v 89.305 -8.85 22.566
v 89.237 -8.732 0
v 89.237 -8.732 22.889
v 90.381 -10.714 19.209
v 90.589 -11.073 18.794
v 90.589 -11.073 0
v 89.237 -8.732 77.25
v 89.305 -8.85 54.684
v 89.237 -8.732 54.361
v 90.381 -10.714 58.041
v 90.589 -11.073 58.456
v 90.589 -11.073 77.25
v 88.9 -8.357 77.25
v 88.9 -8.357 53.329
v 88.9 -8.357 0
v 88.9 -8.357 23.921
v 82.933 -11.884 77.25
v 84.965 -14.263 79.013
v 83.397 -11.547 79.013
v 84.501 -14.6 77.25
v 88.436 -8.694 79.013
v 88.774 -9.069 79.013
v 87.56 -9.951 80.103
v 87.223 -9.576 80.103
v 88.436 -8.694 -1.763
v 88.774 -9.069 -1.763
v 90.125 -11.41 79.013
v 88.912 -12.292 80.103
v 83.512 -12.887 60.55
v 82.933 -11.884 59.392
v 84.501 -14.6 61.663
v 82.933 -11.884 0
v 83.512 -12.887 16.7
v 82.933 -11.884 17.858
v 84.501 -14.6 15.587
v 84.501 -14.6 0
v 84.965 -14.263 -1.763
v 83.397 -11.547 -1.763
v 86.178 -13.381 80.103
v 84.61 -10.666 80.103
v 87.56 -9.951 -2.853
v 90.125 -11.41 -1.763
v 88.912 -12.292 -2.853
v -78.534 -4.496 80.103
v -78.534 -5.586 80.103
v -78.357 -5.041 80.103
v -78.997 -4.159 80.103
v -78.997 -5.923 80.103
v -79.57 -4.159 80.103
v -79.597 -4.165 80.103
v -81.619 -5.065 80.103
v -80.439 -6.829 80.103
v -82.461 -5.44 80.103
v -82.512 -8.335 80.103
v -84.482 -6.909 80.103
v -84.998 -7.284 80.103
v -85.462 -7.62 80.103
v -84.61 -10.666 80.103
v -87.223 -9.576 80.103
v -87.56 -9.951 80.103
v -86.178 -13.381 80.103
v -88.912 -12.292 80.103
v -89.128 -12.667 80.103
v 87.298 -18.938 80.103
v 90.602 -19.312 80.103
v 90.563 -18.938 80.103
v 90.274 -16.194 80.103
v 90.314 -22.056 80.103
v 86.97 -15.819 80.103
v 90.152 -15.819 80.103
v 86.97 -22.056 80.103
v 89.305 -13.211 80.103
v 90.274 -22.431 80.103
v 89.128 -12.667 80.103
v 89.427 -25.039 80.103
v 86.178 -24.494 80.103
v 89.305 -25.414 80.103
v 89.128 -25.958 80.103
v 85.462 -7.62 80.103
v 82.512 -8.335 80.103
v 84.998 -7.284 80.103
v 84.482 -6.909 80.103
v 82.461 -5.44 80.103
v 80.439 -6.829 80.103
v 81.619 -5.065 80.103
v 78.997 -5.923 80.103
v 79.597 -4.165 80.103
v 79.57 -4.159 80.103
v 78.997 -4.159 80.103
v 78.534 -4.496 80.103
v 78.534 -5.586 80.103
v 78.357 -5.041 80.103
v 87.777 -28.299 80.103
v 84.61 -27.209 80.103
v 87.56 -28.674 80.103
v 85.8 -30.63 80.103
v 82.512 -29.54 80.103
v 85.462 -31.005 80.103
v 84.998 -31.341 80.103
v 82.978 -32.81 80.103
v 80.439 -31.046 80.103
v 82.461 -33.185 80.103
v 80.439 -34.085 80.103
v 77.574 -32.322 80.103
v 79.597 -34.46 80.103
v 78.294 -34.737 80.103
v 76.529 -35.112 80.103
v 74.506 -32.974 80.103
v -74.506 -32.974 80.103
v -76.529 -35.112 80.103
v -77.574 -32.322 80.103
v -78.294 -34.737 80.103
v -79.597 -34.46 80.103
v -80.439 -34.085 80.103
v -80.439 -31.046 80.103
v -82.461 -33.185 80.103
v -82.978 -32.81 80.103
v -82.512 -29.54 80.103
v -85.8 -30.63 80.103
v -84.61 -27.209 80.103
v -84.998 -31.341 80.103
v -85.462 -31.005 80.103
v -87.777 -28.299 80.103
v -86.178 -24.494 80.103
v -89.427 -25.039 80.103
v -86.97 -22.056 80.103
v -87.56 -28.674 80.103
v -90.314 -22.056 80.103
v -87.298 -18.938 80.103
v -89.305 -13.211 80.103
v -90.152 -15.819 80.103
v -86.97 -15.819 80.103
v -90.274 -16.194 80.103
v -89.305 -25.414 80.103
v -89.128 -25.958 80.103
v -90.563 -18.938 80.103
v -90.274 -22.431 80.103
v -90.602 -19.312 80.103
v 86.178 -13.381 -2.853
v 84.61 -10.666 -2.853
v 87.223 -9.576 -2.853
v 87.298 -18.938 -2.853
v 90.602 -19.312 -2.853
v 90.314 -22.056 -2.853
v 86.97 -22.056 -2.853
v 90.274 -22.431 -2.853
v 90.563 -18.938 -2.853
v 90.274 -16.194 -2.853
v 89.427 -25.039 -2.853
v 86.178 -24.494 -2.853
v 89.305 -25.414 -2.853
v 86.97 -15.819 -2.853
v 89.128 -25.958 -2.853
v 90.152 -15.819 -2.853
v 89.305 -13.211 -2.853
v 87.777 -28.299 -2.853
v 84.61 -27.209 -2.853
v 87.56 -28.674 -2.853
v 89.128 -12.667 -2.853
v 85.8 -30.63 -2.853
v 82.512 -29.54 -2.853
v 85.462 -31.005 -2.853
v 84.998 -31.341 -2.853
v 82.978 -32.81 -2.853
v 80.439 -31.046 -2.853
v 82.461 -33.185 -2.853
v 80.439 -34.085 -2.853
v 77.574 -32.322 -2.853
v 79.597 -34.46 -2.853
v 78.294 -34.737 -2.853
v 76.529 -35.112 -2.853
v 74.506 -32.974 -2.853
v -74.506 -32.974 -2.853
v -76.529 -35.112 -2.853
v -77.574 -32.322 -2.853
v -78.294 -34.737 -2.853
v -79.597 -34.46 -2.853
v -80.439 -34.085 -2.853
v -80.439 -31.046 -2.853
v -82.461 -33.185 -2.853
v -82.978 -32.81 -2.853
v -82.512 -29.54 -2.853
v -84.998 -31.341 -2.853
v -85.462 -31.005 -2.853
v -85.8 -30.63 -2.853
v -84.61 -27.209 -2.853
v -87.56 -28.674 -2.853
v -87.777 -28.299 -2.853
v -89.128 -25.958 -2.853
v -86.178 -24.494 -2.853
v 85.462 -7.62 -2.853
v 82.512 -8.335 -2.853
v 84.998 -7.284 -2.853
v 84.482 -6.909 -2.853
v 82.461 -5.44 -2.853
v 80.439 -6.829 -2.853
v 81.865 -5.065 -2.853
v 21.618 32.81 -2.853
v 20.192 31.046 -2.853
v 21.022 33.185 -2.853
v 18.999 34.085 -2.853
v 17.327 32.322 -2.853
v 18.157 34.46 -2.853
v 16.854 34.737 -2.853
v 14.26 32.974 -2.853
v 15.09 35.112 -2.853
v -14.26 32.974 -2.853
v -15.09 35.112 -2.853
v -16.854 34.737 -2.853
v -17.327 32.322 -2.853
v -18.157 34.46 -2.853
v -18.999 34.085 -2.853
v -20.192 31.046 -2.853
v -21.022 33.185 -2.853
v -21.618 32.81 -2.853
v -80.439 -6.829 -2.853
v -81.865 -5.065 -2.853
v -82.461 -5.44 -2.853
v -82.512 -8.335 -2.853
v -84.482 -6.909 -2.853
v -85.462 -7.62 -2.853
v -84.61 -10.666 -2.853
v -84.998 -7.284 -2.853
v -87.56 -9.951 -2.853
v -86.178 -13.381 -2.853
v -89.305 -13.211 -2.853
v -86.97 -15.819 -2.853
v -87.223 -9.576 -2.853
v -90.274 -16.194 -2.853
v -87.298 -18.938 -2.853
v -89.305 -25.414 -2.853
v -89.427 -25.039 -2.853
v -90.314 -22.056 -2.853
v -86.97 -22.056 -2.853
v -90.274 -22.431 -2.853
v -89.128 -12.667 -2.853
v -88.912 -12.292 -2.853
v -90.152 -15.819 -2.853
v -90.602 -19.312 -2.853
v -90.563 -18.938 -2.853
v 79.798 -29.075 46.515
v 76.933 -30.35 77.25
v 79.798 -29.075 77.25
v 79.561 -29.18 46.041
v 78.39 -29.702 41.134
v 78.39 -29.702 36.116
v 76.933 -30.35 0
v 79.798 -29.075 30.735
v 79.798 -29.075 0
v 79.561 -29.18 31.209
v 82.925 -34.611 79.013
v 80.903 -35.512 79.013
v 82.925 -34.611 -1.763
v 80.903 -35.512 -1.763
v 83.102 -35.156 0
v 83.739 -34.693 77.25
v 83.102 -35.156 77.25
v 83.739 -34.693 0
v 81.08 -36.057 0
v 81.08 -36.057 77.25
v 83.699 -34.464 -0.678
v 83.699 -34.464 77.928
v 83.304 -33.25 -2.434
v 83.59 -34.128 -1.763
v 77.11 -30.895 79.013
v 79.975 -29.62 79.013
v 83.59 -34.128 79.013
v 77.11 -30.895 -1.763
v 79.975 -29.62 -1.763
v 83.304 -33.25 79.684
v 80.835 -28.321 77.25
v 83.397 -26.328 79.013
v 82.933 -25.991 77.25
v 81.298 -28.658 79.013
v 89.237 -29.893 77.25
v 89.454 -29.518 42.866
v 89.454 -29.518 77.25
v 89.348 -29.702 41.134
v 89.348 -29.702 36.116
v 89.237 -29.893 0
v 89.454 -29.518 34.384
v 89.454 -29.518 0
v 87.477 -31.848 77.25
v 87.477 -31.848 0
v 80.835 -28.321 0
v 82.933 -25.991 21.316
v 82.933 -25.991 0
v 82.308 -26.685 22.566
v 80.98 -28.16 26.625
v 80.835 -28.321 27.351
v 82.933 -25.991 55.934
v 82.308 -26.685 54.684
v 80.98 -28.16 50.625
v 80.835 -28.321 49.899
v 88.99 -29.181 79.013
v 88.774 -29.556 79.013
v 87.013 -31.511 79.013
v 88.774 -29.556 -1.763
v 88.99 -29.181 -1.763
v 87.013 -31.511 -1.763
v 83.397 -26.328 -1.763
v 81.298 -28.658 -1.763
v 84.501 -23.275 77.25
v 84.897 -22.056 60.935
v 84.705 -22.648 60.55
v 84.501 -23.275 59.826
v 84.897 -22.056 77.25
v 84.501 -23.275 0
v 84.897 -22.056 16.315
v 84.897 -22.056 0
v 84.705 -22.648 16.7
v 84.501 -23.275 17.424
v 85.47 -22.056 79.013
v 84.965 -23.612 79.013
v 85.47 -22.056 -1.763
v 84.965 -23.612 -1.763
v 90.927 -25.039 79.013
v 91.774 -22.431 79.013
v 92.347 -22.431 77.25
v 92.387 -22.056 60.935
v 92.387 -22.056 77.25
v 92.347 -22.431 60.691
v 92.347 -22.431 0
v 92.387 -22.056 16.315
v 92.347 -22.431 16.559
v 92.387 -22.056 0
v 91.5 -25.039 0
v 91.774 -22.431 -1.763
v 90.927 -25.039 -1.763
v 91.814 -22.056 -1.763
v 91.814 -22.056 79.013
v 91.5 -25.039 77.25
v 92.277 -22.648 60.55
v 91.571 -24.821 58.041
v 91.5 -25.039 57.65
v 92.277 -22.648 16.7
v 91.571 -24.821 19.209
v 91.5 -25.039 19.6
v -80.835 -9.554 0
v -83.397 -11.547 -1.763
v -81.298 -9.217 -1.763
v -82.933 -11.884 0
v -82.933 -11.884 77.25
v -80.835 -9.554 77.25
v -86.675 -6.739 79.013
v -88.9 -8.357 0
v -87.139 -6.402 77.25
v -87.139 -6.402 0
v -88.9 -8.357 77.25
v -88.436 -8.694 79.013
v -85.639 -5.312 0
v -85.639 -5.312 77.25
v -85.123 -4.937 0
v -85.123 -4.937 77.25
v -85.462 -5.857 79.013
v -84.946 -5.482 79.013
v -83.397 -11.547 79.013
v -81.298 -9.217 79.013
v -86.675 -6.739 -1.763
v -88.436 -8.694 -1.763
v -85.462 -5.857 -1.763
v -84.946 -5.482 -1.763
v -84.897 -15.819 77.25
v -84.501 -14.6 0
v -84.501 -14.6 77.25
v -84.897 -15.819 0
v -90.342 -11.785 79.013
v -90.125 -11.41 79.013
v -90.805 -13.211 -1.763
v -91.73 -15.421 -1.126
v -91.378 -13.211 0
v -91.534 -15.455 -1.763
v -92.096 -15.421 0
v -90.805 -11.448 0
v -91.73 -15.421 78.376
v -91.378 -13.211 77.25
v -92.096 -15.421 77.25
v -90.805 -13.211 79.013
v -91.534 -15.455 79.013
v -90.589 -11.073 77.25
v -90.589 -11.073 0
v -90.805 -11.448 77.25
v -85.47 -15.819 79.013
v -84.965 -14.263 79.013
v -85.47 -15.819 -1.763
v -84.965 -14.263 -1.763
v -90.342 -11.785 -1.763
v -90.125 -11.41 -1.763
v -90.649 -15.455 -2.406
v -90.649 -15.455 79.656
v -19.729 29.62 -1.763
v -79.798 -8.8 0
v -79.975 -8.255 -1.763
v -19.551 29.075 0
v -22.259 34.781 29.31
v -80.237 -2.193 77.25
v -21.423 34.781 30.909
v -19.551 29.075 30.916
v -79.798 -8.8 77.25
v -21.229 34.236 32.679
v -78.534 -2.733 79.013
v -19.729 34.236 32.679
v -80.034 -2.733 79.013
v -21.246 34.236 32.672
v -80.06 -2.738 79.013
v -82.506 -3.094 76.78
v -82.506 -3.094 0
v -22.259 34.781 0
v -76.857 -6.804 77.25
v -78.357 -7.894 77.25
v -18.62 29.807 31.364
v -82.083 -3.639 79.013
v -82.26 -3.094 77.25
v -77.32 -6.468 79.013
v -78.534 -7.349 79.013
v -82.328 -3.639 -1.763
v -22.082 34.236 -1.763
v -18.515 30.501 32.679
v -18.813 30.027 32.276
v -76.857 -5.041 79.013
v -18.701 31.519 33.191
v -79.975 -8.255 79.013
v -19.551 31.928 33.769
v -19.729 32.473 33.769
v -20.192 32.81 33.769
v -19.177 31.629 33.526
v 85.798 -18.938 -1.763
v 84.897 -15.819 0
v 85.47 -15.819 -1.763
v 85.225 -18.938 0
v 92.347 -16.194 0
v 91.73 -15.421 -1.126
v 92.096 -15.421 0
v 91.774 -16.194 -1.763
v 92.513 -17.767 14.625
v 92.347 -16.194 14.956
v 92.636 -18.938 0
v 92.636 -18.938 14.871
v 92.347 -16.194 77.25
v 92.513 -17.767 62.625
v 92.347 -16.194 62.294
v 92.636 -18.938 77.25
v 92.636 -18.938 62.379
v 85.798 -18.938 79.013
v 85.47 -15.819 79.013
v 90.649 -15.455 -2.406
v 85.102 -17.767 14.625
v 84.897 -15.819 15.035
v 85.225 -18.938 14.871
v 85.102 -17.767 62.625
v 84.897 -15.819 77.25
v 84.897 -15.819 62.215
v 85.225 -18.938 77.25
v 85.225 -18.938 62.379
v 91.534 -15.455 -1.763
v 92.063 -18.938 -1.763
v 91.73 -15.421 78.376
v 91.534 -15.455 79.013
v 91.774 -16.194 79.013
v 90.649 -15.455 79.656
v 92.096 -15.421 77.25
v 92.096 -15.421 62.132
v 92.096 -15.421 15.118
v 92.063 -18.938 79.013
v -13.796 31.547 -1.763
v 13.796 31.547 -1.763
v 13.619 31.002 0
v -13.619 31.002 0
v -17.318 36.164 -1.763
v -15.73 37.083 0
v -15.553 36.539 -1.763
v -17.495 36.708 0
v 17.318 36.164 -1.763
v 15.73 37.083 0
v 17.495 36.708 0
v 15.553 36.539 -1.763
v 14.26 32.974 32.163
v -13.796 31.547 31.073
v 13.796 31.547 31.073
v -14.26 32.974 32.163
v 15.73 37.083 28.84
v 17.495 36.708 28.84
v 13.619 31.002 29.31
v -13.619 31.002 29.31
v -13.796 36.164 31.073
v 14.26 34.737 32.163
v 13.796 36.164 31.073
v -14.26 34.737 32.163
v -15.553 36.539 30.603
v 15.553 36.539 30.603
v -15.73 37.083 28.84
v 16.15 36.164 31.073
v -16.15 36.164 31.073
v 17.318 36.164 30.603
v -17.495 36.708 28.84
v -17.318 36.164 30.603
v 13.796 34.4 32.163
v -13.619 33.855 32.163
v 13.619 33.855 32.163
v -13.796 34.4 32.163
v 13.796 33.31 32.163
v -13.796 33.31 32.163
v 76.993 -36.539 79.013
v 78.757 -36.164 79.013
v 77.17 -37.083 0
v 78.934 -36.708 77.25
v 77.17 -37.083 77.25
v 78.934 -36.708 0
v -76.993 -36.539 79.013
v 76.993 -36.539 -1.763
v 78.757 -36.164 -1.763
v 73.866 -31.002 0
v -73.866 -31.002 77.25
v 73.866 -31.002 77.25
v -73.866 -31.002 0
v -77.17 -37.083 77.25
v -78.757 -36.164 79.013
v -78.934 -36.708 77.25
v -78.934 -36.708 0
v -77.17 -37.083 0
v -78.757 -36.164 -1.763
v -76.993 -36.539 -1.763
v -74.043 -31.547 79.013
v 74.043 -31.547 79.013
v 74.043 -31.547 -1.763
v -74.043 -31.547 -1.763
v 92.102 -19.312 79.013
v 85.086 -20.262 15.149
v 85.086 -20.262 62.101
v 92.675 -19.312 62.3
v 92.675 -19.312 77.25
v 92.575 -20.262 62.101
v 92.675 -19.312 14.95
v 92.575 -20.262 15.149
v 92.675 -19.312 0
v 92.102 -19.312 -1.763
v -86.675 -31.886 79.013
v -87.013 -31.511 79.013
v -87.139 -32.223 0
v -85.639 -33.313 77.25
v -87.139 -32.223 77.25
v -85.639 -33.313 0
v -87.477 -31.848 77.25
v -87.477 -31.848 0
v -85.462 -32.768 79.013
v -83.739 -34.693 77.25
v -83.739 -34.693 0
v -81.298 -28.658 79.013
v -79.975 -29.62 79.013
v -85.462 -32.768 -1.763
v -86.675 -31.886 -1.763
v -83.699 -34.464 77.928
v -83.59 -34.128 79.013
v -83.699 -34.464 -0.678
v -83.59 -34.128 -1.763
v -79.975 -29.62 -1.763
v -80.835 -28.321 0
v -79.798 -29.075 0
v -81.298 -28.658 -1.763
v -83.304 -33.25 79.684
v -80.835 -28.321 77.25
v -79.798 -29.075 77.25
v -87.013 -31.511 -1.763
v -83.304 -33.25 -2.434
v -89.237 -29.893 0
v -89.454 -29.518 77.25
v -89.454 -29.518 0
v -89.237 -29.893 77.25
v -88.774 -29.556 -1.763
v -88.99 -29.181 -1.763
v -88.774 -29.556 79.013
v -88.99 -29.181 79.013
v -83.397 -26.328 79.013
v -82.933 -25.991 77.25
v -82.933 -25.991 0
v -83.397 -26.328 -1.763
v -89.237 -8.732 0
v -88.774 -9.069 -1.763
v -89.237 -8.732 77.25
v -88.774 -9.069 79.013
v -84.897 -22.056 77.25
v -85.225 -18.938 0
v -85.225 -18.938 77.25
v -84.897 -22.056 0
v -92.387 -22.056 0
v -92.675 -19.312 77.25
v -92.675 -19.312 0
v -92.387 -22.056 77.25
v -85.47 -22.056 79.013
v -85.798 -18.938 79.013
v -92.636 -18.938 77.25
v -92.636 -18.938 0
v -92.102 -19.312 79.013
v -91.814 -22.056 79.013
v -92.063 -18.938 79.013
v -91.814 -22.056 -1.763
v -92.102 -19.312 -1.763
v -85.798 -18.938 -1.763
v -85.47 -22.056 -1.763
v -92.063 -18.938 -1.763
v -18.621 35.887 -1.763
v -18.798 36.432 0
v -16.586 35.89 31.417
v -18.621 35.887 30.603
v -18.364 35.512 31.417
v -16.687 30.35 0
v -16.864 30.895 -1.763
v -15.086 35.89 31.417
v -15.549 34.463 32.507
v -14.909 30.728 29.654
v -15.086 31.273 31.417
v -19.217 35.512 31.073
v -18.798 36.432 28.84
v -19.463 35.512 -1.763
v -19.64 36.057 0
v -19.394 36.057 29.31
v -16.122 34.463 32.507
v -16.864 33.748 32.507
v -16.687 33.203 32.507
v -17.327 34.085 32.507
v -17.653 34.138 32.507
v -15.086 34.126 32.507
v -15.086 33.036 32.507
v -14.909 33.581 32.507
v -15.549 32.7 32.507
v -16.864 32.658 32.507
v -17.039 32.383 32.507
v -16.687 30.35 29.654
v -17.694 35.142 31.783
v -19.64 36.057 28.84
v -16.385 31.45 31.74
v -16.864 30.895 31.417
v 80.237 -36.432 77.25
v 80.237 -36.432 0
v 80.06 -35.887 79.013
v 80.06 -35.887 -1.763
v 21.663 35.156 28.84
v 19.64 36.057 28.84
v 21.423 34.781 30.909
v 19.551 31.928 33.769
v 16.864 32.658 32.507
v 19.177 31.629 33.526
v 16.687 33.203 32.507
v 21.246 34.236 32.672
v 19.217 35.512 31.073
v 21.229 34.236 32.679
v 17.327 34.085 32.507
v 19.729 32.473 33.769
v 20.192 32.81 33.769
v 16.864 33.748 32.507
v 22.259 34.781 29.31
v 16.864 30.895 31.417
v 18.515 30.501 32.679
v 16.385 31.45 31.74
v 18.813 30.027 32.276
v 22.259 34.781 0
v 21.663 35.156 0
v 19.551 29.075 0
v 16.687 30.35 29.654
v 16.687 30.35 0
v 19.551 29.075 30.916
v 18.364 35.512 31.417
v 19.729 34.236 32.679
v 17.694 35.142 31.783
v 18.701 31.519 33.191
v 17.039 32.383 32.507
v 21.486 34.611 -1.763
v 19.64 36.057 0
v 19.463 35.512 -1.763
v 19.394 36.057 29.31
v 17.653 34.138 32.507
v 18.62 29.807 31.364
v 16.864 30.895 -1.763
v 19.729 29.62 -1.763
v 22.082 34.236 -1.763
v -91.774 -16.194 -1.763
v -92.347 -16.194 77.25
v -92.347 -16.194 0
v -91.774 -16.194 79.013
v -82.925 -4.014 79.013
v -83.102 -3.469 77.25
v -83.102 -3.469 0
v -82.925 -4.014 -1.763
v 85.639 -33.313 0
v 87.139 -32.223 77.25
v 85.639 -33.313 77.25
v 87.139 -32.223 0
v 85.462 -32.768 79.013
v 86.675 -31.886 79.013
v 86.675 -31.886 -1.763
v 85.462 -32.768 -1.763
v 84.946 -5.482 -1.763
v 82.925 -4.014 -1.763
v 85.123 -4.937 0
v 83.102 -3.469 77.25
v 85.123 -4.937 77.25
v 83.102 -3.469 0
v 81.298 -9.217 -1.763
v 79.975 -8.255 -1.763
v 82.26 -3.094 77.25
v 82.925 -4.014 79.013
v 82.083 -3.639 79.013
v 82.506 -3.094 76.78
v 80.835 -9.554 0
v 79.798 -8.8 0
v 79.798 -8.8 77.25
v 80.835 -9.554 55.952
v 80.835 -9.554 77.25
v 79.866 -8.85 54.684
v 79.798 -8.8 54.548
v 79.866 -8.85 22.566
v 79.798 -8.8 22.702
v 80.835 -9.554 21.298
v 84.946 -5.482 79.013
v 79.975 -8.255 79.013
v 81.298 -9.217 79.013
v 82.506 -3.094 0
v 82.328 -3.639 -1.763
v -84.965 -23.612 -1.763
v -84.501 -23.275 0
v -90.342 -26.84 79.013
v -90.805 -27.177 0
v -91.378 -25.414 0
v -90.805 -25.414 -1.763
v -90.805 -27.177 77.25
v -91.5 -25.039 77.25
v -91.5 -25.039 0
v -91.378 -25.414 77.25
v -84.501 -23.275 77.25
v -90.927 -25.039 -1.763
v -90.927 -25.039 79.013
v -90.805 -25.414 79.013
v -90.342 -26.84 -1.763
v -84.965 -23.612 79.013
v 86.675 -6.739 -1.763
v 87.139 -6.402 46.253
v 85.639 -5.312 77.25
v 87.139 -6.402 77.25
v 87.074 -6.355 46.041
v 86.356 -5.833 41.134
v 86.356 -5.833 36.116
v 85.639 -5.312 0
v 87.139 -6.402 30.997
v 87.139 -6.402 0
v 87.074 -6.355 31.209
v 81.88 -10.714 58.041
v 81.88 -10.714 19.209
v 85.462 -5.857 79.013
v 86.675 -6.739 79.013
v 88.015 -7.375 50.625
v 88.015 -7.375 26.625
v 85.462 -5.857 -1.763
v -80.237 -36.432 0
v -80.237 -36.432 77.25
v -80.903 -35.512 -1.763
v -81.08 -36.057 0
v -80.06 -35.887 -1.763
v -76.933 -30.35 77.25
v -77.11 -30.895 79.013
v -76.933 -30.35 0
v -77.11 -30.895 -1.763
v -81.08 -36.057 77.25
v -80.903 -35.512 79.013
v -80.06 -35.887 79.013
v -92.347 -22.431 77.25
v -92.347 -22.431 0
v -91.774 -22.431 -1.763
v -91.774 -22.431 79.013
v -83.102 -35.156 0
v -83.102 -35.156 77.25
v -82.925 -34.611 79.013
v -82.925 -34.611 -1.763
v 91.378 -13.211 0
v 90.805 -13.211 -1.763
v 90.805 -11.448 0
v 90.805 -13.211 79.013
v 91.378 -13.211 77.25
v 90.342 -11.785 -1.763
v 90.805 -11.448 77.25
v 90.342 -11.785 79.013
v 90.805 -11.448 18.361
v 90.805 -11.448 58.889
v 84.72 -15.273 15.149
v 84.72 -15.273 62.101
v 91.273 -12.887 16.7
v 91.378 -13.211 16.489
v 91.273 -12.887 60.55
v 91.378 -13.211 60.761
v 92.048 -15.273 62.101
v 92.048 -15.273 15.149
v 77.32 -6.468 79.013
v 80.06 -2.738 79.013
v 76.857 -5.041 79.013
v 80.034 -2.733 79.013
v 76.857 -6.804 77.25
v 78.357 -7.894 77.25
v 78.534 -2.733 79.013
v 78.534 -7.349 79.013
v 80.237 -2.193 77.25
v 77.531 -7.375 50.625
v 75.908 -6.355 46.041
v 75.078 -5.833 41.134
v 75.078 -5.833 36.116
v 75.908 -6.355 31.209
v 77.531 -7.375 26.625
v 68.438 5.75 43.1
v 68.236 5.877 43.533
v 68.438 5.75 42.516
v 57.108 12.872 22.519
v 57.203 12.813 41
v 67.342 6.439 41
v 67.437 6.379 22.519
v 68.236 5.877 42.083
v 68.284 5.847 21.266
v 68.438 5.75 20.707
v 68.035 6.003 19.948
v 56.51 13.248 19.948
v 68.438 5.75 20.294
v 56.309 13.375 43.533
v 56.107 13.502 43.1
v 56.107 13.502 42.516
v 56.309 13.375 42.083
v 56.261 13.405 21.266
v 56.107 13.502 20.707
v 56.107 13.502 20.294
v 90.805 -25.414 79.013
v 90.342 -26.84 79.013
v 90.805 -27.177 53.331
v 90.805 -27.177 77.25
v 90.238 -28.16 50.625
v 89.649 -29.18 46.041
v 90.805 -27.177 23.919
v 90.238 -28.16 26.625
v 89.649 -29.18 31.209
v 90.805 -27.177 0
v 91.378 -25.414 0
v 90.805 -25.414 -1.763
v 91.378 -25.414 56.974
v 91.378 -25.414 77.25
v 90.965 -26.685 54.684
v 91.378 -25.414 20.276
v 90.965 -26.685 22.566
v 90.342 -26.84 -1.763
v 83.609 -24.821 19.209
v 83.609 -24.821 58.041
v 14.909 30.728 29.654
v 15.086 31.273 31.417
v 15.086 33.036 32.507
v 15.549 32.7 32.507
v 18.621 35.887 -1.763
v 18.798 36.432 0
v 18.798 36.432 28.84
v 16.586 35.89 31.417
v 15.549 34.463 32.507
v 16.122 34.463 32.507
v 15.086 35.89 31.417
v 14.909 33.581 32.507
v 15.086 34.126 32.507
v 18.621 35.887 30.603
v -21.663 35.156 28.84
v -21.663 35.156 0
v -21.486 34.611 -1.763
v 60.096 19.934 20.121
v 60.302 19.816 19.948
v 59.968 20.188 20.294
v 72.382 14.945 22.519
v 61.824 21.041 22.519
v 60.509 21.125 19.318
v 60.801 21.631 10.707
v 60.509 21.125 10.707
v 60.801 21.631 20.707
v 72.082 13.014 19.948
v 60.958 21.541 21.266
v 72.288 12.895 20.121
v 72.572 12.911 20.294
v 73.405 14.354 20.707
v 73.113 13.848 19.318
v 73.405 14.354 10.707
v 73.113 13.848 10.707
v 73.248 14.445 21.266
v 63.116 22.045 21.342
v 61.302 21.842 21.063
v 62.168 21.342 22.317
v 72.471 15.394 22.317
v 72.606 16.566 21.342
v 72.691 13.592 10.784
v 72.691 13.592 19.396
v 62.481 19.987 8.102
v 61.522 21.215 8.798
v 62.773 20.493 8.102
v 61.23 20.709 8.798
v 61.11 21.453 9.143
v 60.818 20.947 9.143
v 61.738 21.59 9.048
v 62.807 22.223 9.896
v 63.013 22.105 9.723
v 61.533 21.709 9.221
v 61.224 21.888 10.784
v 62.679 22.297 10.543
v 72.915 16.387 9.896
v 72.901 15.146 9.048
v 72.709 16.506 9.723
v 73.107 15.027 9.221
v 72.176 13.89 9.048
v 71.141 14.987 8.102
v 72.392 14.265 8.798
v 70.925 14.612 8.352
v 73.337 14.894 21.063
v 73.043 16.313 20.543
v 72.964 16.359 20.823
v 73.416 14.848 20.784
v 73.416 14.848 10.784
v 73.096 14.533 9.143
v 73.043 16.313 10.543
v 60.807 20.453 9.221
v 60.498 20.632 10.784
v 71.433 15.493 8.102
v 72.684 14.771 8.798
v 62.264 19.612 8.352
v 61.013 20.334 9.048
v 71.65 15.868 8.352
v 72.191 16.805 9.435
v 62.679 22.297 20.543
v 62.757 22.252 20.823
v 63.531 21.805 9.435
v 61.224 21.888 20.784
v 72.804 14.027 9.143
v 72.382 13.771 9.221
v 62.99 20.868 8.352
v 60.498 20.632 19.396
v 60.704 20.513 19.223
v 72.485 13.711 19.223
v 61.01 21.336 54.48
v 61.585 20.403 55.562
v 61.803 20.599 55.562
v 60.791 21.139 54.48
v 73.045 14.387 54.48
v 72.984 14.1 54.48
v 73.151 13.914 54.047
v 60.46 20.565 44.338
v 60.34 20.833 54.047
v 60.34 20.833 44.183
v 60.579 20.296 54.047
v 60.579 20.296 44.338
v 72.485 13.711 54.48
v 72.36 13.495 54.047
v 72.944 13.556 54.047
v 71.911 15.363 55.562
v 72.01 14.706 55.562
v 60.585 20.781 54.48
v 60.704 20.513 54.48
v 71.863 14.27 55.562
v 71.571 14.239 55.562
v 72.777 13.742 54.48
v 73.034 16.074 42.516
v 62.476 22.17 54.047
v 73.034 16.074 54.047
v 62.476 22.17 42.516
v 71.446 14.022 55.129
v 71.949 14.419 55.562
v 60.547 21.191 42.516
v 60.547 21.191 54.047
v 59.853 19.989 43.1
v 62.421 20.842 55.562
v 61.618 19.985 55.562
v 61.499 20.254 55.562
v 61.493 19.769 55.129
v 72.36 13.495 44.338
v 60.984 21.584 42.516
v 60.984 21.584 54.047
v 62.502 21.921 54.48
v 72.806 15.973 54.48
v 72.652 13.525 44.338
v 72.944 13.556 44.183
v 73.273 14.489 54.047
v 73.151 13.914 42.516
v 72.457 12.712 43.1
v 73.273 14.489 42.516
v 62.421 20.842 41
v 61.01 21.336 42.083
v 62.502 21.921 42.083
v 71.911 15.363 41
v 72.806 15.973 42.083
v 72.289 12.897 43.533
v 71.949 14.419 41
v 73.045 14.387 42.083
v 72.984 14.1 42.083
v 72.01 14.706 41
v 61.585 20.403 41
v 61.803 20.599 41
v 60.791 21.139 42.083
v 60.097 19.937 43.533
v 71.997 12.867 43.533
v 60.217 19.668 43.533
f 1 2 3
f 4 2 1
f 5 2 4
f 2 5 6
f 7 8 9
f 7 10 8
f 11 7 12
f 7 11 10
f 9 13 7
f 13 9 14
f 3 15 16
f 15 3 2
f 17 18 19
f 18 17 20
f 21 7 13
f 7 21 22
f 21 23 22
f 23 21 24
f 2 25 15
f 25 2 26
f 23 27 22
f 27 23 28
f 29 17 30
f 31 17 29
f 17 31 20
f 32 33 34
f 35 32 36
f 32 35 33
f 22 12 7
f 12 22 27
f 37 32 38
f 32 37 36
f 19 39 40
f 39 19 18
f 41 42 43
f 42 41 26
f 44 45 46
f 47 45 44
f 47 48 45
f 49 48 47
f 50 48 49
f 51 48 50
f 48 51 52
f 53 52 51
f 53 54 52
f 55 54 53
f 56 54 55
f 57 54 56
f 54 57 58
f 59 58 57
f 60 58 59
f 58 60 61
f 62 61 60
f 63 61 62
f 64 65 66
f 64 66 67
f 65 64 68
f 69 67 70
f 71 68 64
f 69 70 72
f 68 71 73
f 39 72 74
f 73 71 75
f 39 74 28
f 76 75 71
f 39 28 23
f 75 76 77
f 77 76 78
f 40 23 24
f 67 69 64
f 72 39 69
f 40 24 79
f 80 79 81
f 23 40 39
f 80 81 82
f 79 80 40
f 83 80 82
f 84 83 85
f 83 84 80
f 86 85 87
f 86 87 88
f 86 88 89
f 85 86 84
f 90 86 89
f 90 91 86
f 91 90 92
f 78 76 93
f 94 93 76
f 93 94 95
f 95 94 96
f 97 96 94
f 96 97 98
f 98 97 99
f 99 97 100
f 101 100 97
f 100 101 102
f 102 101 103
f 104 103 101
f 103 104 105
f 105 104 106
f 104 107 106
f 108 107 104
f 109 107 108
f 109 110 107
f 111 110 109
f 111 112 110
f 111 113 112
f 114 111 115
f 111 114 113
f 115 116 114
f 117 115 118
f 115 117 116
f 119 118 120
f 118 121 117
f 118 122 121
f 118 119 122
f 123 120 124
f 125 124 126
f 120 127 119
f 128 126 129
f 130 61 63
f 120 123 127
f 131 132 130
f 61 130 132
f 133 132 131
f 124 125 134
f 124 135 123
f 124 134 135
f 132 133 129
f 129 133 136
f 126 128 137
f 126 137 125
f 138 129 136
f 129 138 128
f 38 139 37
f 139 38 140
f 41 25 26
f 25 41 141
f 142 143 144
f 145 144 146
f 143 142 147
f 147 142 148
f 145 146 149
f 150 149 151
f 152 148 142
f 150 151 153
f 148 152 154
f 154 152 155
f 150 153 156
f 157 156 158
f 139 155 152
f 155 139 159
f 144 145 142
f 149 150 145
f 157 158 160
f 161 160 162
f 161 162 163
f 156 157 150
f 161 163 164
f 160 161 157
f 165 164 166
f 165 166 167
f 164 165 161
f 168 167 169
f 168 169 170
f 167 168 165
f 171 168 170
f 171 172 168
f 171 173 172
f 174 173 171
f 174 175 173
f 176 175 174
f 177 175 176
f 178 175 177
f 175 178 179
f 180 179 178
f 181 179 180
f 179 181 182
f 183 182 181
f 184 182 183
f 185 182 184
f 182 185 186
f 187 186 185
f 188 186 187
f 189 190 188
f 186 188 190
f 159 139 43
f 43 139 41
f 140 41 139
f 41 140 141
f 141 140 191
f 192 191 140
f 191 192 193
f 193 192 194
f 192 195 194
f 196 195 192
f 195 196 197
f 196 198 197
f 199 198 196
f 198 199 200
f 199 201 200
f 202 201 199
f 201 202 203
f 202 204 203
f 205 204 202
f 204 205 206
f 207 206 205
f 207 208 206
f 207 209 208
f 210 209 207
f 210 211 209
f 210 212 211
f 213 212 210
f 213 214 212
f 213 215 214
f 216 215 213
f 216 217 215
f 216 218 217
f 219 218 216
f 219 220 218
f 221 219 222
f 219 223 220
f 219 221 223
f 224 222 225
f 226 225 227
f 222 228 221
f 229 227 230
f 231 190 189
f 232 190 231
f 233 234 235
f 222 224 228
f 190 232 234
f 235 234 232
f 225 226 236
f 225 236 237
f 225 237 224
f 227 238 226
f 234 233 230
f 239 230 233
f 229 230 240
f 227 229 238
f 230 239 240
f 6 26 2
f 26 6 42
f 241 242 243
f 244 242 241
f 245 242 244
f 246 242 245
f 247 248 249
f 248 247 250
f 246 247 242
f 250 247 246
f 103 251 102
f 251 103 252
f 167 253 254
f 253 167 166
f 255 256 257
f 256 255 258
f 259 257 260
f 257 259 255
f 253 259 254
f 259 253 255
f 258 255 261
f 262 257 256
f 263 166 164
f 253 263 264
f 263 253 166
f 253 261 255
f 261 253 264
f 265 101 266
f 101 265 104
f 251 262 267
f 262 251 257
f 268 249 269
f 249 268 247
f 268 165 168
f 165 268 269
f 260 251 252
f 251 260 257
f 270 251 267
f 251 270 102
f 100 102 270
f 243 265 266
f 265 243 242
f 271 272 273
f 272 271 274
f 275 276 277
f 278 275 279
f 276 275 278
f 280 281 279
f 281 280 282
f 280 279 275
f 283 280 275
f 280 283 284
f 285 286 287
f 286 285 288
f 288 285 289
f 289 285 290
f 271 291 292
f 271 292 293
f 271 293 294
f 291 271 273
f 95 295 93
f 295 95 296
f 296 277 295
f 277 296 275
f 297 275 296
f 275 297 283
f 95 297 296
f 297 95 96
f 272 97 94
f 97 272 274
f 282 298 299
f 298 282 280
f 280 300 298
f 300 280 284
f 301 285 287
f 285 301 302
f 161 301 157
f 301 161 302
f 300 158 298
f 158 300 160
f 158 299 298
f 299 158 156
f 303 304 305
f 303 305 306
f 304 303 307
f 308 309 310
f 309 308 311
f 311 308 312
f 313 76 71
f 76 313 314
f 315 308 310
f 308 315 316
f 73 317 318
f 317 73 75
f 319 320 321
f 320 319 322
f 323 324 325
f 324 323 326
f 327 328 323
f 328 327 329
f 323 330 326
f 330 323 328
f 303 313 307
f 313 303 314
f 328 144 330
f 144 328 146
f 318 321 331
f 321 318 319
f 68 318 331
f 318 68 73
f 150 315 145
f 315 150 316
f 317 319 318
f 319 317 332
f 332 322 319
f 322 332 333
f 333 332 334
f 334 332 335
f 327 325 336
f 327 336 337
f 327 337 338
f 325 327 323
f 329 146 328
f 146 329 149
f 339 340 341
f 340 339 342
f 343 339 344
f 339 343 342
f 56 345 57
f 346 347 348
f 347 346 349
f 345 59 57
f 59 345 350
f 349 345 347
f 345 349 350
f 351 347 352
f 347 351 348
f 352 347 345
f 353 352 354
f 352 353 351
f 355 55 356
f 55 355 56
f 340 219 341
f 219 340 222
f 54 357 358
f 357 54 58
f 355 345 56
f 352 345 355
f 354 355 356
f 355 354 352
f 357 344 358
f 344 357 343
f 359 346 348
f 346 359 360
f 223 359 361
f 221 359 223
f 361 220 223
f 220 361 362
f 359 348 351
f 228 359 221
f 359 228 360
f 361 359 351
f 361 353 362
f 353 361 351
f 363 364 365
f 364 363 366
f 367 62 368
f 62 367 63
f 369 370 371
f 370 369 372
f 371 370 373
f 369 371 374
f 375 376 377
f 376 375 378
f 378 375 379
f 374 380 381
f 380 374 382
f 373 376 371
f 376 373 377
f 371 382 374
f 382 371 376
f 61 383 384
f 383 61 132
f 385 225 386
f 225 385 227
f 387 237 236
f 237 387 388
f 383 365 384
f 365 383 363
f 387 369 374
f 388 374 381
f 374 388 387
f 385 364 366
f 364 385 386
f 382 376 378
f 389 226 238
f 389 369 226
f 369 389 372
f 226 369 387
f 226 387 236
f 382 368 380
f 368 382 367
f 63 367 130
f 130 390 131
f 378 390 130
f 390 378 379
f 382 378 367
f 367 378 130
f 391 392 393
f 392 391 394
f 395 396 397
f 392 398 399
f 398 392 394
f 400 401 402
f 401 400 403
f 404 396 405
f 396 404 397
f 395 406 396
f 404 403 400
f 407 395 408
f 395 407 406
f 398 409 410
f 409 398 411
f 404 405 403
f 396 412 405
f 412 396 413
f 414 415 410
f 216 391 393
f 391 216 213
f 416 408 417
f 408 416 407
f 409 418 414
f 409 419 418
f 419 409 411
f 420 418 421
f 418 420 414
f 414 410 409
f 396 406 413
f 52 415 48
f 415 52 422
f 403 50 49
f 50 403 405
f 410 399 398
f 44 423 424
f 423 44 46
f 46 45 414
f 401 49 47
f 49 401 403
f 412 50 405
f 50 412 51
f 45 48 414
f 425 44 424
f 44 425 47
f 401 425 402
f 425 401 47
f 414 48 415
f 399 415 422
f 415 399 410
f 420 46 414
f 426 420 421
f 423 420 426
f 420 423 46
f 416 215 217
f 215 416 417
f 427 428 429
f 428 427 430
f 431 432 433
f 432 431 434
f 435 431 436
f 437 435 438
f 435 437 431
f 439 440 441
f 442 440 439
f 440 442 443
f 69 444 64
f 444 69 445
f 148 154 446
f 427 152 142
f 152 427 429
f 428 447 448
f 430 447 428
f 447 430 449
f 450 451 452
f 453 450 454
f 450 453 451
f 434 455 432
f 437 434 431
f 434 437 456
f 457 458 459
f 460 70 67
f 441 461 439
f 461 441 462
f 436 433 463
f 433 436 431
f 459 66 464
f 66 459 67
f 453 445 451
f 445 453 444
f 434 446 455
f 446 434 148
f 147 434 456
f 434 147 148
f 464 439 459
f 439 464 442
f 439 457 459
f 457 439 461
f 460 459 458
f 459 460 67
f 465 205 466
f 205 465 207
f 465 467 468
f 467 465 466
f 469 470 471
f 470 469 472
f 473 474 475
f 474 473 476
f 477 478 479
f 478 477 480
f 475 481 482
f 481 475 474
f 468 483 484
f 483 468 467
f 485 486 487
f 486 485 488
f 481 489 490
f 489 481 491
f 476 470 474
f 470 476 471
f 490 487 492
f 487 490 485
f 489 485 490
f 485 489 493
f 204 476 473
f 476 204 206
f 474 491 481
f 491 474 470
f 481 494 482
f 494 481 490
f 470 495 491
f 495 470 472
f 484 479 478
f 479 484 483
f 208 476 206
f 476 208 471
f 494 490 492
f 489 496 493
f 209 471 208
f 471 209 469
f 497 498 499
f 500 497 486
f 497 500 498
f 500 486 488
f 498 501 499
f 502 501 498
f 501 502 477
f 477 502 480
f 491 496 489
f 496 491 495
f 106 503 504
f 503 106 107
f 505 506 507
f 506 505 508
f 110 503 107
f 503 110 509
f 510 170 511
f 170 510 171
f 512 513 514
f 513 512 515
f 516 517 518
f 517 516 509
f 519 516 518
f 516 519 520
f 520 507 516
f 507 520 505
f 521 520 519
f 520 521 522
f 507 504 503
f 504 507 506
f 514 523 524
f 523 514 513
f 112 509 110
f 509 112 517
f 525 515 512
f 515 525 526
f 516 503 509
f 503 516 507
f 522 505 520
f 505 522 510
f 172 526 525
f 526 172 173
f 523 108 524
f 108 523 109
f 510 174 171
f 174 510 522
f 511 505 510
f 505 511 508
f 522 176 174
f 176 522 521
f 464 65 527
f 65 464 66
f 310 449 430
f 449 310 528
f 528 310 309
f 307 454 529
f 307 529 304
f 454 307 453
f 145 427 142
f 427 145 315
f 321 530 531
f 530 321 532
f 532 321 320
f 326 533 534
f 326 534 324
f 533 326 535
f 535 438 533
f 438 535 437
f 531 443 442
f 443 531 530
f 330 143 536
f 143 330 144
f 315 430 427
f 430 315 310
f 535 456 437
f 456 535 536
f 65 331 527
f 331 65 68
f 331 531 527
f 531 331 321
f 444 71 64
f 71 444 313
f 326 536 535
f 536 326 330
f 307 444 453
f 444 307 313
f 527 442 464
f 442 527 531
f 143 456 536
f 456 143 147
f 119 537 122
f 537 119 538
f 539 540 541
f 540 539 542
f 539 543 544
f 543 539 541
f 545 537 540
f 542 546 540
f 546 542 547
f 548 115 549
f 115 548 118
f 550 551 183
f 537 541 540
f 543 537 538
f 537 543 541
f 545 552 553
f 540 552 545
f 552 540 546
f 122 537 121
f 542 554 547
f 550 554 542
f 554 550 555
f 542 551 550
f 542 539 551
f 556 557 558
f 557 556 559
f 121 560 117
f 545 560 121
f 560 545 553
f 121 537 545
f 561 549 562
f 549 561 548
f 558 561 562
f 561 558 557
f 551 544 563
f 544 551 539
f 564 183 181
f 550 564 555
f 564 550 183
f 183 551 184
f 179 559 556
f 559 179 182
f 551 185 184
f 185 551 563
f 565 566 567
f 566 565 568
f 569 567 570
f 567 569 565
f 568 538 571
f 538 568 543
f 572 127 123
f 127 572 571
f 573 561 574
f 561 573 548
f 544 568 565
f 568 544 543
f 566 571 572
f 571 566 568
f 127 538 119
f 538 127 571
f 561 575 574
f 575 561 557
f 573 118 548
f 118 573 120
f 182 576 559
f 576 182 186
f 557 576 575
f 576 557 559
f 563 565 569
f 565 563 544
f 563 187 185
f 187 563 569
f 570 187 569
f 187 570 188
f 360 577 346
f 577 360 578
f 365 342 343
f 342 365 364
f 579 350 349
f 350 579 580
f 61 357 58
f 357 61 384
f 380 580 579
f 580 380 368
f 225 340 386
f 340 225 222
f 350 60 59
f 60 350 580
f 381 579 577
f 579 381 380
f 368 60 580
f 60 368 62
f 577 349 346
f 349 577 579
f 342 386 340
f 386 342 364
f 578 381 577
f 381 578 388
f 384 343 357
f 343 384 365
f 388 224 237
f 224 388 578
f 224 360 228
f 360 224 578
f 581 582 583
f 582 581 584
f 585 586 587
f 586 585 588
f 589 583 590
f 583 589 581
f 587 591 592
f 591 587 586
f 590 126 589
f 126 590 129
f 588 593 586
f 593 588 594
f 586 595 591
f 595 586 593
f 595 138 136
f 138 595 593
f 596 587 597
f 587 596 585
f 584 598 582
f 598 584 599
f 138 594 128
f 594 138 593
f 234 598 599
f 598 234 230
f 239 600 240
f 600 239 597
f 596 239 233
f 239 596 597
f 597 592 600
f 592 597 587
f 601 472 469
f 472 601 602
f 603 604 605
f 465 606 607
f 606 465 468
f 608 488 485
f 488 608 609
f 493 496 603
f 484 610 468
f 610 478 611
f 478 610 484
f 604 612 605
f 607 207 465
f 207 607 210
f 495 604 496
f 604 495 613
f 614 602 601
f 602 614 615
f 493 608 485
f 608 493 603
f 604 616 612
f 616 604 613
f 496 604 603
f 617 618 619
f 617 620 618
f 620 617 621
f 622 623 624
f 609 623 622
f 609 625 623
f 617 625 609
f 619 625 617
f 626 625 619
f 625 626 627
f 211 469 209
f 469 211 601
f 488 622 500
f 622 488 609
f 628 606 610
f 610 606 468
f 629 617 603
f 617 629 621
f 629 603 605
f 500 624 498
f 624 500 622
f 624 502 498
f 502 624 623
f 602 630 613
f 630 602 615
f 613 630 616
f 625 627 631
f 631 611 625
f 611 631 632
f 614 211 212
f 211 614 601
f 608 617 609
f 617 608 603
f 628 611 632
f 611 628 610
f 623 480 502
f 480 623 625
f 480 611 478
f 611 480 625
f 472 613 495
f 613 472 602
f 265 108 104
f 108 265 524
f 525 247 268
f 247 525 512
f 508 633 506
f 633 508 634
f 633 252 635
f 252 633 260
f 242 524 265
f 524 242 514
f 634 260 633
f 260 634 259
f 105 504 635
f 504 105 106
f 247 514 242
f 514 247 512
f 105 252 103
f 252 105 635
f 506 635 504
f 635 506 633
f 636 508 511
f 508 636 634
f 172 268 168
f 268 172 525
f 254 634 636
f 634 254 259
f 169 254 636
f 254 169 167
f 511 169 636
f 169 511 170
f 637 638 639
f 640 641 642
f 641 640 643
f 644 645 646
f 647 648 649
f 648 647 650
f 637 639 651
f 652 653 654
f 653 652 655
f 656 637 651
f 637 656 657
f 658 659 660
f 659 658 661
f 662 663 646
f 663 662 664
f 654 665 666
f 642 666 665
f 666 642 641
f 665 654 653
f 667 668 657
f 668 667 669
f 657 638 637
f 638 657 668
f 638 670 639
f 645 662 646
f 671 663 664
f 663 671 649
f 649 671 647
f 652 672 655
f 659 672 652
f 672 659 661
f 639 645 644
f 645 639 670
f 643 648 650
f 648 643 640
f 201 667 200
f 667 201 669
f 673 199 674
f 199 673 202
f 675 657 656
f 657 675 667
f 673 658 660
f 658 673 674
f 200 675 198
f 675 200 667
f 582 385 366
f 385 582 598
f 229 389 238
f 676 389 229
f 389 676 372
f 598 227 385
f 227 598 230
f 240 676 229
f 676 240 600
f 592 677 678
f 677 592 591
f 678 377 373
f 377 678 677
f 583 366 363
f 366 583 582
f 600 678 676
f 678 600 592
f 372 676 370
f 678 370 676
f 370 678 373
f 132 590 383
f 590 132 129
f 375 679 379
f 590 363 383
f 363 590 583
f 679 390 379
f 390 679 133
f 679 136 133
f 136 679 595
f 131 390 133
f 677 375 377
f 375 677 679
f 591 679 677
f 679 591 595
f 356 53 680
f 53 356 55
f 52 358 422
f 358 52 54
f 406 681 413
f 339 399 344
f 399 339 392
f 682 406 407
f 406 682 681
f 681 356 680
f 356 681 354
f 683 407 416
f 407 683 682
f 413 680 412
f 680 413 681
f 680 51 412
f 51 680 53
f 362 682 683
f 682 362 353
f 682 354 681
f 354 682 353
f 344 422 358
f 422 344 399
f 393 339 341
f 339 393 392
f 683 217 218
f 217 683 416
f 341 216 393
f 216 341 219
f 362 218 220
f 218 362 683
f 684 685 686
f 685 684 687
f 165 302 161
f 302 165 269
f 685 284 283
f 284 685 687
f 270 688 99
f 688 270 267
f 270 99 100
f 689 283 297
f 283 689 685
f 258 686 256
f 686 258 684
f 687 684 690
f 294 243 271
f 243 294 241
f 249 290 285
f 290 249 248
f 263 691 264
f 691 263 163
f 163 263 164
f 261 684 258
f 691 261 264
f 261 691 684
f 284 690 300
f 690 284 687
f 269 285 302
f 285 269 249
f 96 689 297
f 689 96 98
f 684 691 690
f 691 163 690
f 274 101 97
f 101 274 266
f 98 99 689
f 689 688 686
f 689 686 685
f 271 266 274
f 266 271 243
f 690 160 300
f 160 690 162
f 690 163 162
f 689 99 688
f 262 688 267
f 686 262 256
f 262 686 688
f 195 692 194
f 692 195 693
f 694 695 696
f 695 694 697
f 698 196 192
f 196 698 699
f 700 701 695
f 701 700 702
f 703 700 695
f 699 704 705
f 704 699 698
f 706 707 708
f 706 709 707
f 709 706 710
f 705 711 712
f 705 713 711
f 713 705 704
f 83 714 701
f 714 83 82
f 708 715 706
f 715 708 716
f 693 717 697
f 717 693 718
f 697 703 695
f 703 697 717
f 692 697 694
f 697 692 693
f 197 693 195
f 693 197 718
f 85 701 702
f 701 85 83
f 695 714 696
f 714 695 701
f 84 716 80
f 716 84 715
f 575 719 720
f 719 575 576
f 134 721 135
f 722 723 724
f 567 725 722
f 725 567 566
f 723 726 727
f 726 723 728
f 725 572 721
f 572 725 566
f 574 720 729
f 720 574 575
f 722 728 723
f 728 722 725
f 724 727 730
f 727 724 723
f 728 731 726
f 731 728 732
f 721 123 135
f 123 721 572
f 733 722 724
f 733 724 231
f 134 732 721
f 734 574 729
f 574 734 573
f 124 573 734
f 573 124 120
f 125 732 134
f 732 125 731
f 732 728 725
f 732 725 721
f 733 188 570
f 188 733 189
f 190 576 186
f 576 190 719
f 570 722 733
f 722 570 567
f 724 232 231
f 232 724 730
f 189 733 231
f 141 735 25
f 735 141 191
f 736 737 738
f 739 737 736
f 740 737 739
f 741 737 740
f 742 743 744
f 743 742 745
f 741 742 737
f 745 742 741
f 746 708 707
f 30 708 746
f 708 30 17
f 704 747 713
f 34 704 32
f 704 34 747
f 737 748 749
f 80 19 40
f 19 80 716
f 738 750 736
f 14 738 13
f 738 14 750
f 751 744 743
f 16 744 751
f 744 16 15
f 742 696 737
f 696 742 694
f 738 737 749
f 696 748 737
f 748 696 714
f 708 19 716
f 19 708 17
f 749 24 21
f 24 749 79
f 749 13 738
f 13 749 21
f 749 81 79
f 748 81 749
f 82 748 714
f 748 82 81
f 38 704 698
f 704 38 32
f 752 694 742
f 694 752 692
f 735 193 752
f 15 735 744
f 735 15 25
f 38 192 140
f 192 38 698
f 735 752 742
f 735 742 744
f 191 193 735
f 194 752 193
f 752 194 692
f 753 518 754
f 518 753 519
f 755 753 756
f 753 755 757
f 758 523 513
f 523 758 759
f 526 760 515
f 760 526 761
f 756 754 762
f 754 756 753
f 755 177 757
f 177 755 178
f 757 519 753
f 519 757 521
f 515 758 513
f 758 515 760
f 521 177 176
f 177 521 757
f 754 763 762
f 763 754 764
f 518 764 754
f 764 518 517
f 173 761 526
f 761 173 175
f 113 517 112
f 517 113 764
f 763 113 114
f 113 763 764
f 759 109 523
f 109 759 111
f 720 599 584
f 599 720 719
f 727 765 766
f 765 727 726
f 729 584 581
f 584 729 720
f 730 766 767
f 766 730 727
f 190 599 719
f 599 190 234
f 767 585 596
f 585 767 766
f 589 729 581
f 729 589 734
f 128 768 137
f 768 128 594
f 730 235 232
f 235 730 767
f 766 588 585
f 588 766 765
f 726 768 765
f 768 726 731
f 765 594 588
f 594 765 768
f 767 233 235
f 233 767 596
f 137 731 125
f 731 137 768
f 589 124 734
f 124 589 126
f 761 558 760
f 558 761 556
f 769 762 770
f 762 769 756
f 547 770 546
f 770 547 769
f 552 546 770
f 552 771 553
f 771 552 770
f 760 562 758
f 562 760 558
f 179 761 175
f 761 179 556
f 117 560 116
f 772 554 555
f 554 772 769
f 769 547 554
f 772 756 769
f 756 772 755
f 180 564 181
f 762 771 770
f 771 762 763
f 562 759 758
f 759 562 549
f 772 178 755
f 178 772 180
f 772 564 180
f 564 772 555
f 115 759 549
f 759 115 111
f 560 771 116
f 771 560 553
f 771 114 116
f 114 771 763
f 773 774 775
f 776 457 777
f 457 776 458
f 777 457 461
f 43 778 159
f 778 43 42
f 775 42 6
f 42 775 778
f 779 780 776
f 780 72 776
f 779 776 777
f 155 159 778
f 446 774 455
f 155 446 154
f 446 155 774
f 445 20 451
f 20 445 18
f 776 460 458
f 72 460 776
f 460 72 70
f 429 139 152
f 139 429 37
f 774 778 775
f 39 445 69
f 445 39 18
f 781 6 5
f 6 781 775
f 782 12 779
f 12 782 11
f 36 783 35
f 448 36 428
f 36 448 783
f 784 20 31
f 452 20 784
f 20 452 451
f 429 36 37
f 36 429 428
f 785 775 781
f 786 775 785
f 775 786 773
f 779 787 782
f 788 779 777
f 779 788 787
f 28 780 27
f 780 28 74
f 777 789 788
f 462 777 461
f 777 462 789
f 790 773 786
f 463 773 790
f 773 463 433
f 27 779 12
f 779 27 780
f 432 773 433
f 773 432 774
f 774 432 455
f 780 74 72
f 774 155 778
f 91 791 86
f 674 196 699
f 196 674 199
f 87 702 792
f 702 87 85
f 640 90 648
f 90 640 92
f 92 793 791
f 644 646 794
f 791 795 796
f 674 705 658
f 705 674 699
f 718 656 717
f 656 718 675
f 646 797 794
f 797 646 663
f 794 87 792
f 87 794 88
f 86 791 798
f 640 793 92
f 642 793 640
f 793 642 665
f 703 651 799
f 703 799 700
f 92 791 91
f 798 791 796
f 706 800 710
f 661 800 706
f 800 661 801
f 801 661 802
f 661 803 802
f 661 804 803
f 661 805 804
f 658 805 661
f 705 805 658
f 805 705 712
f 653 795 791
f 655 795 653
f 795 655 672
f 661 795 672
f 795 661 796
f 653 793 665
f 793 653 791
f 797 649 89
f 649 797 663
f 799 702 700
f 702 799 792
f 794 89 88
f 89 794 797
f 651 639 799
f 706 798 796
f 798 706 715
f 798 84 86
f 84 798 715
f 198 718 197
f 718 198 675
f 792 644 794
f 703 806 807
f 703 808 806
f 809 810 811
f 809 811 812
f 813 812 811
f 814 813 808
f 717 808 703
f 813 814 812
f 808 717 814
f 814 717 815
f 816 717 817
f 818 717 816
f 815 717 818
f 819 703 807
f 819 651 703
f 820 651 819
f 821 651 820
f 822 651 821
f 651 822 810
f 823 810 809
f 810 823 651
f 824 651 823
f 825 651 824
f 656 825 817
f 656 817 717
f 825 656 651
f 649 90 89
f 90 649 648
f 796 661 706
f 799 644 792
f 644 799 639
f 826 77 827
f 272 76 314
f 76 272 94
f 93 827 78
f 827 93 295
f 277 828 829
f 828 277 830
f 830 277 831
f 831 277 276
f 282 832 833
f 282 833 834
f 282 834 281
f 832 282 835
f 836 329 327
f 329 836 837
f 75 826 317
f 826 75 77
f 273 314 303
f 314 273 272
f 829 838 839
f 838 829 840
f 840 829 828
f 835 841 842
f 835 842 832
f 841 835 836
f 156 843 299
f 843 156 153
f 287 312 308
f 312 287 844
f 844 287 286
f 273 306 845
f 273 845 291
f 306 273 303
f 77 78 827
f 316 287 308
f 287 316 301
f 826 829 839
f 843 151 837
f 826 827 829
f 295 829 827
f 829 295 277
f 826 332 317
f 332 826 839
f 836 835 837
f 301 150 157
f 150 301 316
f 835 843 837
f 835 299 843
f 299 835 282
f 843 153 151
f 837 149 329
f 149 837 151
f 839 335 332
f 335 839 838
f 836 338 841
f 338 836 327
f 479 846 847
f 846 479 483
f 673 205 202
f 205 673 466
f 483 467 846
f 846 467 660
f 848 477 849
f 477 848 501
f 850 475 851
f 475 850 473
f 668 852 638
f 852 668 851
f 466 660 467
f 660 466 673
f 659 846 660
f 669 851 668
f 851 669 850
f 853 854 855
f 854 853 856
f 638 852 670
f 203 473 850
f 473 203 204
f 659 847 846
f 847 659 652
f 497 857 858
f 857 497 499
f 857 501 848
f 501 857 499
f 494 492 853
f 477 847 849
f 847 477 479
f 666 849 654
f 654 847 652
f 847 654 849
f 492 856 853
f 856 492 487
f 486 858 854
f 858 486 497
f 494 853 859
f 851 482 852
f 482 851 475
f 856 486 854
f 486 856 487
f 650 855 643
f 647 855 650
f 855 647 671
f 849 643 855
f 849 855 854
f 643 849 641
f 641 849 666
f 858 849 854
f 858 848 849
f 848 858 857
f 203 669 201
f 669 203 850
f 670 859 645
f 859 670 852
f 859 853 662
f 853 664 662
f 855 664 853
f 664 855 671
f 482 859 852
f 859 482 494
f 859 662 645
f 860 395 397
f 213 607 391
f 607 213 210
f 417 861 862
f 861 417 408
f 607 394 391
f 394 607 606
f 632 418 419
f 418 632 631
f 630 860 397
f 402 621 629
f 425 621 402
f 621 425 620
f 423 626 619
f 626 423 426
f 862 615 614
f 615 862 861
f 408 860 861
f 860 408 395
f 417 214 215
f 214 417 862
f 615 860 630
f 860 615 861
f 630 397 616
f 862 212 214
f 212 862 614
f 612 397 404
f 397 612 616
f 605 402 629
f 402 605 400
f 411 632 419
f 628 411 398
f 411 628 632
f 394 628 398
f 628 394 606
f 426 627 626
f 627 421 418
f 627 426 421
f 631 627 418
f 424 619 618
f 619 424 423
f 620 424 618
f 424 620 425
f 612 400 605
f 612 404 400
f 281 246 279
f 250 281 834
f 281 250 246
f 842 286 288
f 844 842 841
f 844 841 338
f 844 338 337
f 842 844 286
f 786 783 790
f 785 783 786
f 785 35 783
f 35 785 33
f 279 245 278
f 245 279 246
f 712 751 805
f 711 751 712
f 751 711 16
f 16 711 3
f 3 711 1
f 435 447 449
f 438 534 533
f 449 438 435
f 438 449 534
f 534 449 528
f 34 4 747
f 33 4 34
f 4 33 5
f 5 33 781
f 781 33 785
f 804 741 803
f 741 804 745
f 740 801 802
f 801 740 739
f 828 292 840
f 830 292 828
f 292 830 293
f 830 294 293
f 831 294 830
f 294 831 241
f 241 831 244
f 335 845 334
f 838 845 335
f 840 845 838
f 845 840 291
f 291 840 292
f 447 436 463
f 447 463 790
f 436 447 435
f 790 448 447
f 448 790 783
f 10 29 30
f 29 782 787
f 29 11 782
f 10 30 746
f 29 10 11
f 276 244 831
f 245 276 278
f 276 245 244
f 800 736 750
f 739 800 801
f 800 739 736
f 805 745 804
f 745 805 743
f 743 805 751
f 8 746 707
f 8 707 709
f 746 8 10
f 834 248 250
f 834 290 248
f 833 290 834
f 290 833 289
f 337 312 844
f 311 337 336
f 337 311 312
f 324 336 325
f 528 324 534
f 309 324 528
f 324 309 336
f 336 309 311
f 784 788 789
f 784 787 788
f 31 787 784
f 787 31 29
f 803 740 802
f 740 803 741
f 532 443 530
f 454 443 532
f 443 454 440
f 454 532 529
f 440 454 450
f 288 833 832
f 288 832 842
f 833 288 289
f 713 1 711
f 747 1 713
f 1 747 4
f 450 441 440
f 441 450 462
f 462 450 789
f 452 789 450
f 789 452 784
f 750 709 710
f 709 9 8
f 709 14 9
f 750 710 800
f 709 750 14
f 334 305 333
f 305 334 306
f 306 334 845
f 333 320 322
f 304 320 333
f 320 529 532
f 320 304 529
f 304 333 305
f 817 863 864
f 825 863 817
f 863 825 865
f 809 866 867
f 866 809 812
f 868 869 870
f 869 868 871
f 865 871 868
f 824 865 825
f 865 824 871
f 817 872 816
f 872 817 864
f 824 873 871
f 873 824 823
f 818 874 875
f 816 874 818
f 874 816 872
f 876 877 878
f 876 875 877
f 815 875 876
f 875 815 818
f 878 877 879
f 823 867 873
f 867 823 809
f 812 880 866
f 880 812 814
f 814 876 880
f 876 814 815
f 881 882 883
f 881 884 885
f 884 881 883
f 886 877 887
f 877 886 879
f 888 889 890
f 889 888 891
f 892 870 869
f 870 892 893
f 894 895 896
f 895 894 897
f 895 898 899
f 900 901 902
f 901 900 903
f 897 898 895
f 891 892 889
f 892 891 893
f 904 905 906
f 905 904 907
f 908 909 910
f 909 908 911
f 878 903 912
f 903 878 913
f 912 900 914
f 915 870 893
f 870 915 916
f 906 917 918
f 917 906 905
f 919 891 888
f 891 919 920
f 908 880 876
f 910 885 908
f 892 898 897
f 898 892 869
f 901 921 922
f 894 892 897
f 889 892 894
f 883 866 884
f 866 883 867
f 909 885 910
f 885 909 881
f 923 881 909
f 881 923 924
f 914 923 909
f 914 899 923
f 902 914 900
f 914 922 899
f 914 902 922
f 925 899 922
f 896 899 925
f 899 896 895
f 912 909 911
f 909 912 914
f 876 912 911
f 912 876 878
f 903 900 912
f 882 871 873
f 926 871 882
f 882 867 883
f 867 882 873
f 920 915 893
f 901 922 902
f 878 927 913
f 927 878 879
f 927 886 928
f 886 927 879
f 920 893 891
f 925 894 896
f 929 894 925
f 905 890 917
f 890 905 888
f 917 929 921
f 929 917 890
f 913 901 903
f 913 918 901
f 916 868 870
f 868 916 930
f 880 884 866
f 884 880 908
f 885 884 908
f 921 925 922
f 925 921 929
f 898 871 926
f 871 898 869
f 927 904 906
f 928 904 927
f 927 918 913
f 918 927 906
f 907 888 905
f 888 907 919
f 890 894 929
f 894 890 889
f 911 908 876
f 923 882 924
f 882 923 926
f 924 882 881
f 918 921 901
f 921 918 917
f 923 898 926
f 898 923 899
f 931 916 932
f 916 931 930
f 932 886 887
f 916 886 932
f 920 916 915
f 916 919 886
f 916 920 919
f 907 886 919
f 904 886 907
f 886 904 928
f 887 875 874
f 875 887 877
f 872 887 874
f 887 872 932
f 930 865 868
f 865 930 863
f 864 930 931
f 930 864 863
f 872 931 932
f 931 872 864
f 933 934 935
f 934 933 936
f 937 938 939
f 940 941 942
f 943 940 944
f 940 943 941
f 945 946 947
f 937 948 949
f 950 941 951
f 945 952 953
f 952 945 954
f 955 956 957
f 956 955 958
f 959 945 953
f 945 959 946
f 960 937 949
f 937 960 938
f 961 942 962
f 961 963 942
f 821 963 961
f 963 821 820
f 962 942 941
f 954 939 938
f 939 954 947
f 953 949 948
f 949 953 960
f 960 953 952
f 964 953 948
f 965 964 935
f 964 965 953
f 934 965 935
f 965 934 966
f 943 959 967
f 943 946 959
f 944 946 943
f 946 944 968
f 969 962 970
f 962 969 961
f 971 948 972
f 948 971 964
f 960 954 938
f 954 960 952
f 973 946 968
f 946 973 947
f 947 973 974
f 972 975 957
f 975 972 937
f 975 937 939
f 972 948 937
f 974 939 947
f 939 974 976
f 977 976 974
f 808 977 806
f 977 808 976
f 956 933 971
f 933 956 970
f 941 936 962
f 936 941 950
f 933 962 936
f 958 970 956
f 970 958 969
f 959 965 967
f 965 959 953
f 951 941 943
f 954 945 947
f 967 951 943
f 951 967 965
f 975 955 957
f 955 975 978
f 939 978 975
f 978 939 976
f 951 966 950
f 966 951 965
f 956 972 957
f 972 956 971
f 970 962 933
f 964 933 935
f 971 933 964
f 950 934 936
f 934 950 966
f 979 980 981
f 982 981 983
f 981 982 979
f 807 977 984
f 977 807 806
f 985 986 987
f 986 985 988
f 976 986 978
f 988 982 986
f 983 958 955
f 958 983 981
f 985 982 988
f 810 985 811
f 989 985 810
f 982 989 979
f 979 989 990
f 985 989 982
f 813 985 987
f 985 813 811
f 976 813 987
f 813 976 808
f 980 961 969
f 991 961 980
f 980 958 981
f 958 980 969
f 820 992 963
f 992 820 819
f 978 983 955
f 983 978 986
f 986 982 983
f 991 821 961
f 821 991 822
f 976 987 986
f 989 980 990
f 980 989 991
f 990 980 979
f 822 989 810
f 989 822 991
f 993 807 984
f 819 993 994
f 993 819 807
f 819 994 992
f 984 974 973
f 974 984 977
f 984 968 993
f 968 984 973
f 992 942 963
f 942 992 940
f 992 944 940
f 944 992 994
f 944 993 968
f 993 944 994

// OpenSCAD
//Design an Object: Outlet Phone Holder
//By jessicad2020
//v.1.2, 24 Jan 2019

//parameters -----------------------------------------------
chargeW = 25.7; //width of an Apple charger block
chargeL = 28; //length of an Apple charger block
chargeH = 26.3; //height of an Apple charger block
phoneL = 145; //length of phone with case
phoneW = 75; //width of phone with case
phoneH = 15; //height of phone with case
rad = 15; //cylinder radius
scrad = 12; //oval radius
hs = 15; //hook size
sd= 2; //sphere diameter

//render ---------------------------------------------------
%phone();
holder(1.03);
%charge();

//modules --------------------------------------------------
module holder(size) {
    difference() {
        minkowski() {
            holderbase(size);
            sphere(r=sd*1.5);
        }
        semic(size);
    }
    translate([phoneL*size*0.43,13,phoneW/5*size]) {
        rotate([0,90,60]) {
            hook(10);
        }
    }
    translate([phoneL*size*0.43,13,phoneW/1.6*size]) {
        rotate([0,180,60]) {
            hook(10);
        }
    }
}

module holderbase(size) {
    difference() {
        triangle(size, 1);
        triangle(size-0.02, 5);
    }       
}

module hook(s) {
    minkowski() {
        difference() {
            roundbx(s);
            translate([s/1.5,0,s/-1.5]) {
                roundbx(s*2);
            }
        }
        sphere(d=sd/2);
    }
}

module roundbx(size) {
    minkowski() {
        cube(size=size, center=true);
        sphere(sd);
    }
}

module semic(size) {
   translate([phoneL*size*0.55, phoneW*size*-0.23, phoneW/2*size]) {
       rotate([0,90,0]) {
           scale([2,1,1]) {
               cylinder(r=scrad, h=scrad*3, center=true);
           }
       }
  } 
}

module triangle(size, height) {
    hull() {
        translate([phoneL*size*0.5, phoneW*size/2*-0.5, phoneW*size*0.5]) {
            cylinder(h=phoneW*size*height, r=rad, center=true);
    }
        translate([phoneL*size*-0.5, phoneW*size/2*-0.5, phoneW*size*0.5]) {
            cylinder(h=phoneW*size*height, r=rad, center=true);
        }
        translate([chargeW*size*0.5, phoneW*size/2*0.5, chargeL*size*0.5]) {
            cylinder(h=chargeL*size*height, r=rad, center=true);
        }
        translate([chargeW*size*-0.5, phoneW*size/2*0.5, chargeL*size*0.5]) {
            cylinder(h=chargeL*size*height, r=rad, center=true);
        }
    }
    
}

module phone() {
    translate([0,phoneL*-0.15, phoneW*0.5]) {
        cube([phoneL, phoneH, phoneW], center=true);
    }
}

module charge() {
    translate([0,phoneW*0.15,chargeL/2]) {
        cube([chargeW, chargeH, chargeL], center=true);
    }
}
